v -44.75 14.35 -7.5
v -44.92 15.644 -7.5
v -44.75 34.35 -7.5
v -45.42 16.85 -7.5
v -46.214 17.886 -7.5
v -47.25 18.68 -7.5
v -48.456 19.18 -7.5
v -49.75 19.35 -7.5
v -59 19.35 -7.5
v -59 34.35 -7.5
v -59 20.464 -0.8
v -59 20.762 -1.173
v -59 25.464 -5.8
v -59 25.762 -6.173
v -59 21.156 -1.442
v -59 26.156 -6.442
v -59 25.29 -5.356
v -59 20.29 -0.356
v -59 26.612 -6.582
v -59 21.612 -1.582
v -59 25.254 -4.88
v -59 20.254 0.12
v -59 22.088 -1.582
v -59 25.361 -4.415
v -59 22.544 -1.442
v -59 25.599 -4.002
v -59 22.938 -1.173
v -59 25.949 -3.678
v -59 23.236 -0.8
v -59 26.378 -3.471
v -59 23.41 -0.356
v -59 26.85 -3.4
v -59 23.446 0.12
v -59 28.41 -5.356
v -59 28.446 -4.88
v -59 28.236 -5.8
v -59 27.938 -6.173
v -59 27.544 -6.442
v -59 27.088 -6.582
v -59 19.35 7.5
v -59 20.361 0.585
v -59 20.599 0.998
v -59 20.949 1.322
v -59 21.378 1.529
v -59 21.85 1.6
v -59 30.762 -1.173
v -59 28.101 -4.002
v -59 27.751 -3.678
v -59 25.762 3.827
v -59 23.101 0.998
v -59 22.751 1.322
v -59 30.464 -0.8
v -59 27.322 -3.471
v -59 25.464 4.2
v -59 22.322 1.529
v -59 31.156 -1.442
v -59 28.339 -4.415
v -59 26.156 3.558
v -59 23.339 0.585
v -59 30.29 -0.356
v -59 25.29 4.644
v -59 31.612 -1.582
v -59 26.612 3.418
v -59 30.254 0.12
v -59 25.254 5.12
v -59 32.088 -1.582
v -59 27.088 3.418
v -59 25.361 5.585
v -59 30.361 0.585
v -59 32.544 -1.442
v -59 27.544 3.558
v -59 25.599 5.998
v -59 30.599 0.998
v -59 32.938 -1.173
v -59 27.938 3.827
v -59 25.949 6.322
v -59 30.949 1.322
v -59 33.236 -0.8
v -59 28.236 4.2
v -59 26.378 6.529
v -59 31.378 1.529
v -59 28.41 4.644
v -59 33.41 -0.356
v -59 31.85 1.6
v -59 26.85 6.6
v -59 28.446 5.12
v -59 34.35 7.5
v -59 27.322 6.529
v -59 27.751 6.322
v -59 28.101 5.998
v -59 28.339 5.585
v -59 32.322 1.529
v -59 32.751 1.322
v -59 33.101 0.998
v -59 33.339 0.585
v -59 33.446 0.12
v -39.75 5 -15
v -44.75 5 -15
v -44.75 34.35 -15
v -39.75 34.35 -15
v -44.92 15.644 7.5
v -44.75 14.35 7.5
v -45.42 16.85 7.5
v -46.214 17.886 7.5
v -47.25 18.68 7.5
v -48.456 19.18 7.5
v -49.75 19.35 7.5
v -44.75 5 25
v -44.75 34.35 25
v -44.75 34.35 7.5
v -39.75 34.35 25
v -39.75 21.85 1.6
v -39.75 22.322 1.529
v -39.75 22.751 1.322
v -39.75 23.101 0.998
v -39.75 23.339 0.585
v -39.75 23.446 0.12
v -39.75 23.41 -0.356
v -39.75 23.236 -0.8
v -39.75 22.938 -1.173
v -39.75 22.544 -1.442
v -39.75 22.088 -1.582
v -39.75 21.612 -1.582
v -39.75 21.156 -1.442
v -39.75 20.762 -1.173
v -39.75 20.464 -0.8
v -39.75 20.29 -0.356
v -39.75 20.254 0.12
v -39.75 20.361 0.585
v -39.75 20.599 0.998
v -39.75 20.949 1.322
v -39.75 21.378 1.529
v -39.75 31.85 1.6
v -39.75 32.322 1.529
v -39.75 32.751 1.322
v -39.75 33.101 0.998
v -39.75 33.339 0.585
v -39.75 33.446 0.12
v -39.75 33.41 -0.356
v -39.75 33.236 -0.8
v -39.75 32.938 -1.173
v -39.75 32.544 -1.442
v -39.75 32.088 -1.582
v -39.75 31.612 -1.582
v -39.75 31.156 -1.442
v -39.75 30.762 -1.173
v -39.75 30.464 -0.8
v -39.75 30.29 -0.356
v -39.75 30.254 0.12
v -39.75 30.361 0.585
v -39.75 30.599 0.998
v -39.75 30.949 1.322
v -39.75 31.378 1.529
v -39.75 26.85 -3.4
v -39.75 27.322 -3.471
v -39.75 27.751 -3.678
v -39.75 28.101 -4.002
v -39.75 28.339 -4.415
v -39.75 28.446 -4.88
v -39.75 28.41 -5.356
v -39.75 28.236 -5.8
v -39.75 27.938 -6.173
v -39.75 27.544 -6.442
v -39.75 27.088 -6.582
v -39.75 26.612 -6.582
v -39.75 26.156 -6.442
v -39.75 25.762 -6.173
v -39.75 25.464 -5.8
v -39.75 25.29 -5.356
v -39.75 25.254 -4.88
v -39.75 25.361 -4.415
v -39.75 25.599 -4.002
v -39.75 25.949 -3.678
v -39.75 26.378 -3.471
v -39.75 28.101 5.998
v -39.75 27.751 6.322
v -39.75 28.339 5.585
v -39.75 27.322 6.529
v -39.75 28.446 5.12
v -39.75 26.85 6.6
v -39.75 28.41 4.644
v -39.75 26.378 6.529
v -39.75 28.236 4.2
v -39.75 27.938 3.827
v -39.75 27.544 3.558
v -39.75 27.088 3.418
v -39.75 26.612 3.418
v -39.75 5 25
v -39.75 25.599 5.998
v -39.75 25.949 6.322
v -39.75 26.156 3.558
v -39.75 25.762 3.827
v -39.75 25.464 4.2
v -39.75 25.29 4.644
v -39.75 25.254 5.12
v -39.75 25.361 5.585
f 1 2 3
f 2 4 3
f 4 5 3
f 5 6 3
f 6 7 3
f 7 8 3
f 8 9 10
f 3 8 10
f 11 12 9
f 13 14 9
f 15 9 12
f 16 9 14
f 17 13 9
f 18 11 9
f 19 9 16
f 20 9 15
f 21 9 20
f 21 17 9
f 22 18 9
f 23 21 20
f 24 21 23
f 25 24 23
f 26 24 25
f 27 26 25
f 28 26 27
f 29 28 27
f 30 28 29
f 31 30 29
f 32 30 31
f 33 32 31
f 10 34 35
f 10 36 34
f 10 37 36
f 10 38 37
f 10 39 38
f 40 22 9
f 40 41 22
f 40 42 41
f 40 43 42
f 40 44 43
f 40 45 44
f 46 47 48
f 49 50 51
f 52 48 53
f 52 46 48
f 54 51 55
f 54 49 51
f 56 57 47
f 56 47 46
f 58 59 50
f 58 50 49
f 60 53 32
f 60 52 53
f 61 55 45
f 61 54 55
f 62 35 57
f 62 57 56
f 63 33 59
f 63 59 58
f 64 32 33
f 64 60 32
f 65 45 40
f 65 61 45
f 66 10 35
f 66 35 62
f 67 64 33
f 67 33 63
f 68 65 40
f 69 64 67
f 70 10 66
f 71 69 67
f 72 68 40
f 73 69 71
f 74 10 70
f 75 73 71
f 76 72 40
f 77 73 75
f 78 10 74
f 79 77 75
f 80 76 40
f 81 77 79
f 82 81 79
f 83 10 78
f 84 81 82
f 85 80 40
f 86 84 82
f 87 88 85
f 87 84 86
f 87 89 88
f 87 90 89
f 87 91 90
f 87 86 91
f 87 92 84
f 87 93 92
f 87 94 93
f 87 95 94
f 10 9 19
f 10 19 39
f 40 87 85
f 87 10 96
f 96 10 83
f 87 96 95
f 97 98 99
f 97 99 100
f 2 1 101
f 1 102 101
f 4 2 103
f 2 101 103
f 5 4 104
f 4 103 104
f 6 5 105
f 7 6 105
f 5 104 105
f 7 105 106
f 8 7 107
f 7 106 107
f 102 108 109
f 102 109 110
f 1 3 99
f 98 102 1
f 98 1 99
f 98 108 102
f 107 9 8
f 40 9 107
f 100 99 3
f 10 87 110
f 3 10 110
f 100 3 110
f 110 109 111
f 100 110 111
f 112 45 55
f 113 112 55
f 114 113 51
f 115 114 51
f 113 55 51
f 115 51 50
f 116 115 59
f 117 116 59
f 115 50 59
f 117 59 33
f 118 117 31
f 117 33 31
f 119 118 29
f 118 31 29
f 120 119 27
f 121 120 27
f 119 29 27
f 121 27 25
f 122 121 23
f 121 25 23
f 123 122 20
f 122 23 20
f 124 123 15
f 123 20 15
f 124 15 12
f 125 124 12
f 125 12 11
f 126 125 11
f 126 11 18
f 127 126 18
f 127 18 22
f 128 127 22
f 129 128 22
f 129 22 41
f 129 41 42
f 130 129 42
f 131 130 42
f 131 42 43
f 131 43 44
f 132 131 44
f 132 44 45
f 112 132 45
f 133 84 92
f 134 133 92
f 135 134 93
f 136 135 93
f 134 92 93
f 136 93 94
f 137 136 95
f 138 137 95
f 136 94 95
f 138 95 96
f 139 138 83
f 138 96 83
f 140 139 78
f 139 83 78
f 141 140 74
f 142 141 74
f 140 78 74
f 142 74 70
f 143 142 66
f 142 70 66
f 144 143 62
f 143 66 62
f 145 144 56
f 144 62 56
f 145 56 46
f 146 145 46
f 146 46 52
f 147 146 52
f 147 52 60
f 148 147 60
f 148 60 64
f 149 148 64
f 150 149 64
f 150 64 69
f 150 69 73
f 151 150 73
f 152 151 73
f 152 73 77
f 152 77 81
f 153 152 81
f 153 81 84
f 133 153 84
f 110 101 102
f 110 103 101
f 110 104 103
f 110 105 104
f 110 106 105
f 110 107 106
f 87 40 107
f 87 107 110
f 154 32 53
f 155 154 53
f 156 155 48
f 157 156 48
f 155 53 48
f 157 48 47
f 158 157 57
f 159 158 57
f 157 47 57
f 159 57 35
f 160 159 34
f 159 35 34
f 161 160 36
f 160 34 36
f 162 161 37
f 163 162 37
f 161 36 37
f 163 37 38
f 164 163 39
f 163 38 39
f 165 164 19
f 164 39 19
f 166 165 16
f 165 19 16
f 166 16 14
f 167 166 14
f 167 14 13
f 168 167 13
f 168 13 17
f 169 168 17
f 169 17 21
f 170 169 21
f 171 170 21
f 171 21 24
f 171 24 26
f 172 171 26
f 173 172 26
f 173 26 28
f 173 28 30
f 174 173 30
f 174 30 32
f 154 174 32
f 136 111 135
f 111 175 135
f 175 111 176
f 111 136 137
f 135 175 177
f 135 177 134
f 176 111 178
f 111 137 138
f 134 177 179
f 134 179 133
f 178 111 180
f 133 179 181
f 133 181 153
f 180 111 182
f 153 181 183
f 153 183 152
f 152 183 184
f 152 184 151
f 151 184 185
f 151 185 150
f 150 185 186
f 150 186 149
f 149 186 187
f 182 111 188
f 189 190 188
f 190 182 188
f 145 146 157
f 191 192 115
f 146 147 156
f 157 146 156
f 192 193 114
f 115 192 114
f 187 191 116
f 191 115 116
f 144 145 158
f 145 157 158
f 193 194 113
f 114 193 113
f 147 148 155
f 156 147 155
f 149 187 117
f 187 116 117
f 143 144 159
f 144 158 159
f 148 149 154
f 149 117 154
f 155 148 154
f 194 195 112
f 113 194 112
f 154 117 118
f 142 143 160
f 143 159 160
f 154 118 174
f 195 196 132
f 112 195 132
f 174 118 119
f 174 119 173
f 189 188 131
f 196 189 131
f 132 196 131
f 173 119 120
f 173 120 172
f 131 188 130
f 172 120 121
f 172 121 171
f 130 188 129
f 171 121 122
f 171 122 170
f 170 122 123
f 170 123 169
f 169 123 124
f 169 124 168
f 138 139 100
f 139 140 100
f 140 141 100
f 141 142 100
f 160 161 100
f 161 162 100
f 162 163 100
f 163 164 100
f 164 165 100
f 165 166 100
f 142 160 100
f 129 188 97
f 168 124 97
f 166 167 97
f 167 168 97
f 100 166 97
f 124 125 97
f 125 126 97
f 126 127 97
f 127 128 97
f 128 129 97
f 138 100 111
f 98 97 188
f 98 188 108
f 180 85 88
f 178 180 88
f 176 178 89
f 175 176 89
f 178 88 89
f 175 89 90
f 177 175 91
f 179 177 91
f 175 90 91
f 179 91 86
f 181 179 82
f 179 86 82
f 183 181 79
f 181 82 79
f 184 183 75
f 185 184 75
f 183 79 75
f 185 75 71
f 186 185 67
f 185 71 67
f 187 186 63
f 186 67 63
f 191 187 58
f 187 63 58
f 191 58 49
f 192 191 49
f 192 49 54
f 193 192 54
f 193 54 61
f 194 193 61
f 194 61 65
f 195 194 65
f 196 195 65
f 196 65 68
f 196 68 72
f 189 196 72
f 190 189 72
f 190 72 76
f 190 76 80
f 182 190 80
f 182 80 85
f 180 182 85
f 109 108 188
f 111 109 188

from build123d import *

# Parameters (mm, degrees)
BOSS_EXTRUDE1_DEPTH     = 5
CUT_EXTRUDE1_DEPTH      = 114.468057179
CUT_EXTRUDE1_DEPTH_BACK = 114.468057179
SKETCH3_R               = 1.6
SKETCH4_R               = 2.55
CUT_EXTRUDE2_DEPTH      = 10
SKETCH5_R               = 1.55
CUT_EXTRUDE3_DEPTH      = 114.468057179
SKETCH6_R               = 1.55
CUT_EXTRUDE4_DEPTH      = 114.468057179
SKETCH7_W               = 23
SKETCH7_H               = 110
BOSS_EXTRUDE2_DEPTH     = 5
SKETCH9_W               = 5
SKETCH9_H               = 40
BOSS_EXTRUDE4_DEPTH     = 33
SKETCH11_W              = 12
SKETCH11_H              = 12
CUT_EXTRUDE5_DEPTH      = 50
SKETCH12_R              = 1.6
CUT_EXTRUDE6_DEPTH      = 50
BOSS_EXTRUDE5_START     = 14.25
SKETCH13_W              = 15
SKETCH13_H              = 15
SKETCH13_R              = 1.6
BOSS_EXTRUDE5_DEPTH     = 14.25
SKETCH15_W              = 89.5
SKETCH15_H              = 3.65
CUT_EXTRUDE9_DEPTH      = 153.144667997
SKETCH18_W              = 13
SKETCH18_H              = 110
CUT_EXTRUDE10_DEPTH     = 134.005347637
FILLET5_R               = 5
SKETCH19_R              = 1.55
CUT_EXTRUDE11_DEPTH     = 5
CUT_EXTRUDE12_DEPTH     = 189.758900452


with BuildPart() as part:
    # Sketch1 → Boss-Extrude1 (new body)
    with BuildSketch(Plane(origin=(0, 0, 0), x_dir=(1, 0, 0), z_dir=(0, 1, 0))):
        Polygon((75, 85), (-75, 85), (-75, -25), (-45, -45), (-45, -80), (45, -80), (45, -45), (75, -25), align=None)
        Polygon((-18.5, -10), (-18.5, 10), (-7.5, 10), (-7.5, 50), (7.5, 50), (7.5, 10), (18.5, 10), (18.5, -10), align=None, mode=Mode.SUBTRACT)
    extrude(amount=BOSS_EXTRUDE1_DEPTH)

    # Sketch3 → Cut-Extrude1 (cut, two sides: drawn at the far end of the back side and taken through both)
    with BuildSketch(Plane(origin=(0, 5, 0), x_dir=(1, 0, 0), z_dir=(0, 1, 0)).offset(-CUT_EXTRUDE1_DEPTH_BACK)):
        with Locations((-35, 20)):
            Circle(SKETCH3_R)
        with Locations((-35, -20)):
            Circle(SKETCH3_R)
        with Locations((35, -20)):
            Circle(SKETCH3_R)
        with Locations((35, 20)):
            Circle(SKETCH3_R)
    extrude(amount=CUT_EXTRUDE1_DEPTH + CUT_EXTRUDE1_DEPTH_BACK, mode=Mode.SUBTRACT)

    # Sketch4 → Cut-Extrude2 (cut)
    with BuildSketch(Plane(origin=(0, 5, 0), x_dir=(1, 0, 0), z_dir=(0, 1, 0))):
        with Locations((-65, 66)):
            Circle(SKETCH4_R)
        with Locations((-65, -4)):
            Circle(SKETCH4_R)
        with Locations((65, 66)):
            Circle(SKETCH4_R)
        with Locations((65, -4)):
            Circle(SKETCH4_R)
    extrude(amount=-CUT_EXTRUDE2_DEPTH, mode=Mode.SUBTRACT)

    # Sketch5 → Cut-Extrude3 (cut, through all)
    with BuildSketch(Plane(origin=(0, 5, 0), x_dir=(1, 0, 0), z_dir=(0, 1, 0))):
        with Locations((-39, -75)):
            Circle(SKETCH5_R)
        with Locations((39, -75)):
            Circle(SKETCH5_R)
        with Locations((-39, -50)):
            Circle(SKETCH5_R)
        with Locations((39, -50)):
            Circle(SKETCH5_R)
    extrude(amount=-CUT_EXTRUDE3_DEPTH, mode=Mode.SUBTRACT)

    # Sketch6 → Cut-Extrude4 (cut, through all)
    with BuildSketch(Plane(origin=(0, 5, 0), x_dir=(1, 0, 0), z_dir=(0, 1, 0))):
        with Locations((62.5, 80)):
            Circle(SKETCH6_R)
        with Locations((-62.5, 80)):
            Circle(SKETCH6_R)
    extrude(amount=-CUT_EXTRUDE4_DEPTH, mode=Mode.SUBTRACT)

    # Sketch7 → Boss-Extrude2 (add)
    with BuildSketch(Plane(origin=(0, 5, 0), x_dir=(1, 0, 0), z_dir=(0, 1, 0))):
        with Locations((-86.5, 30)):
            Rectangle(SKETCH7_W, SKETCH7_H)
        with Locations((86.5, 30)):
            Rectangle(SKETCH7_W, SKETCH7_H)
    extrude(amount=-BOSS_EXTRUDE2_DEPTH)

    # Sketch9 → Boss-Extrude4 (add)
    with BuildSketch(Plane(origin=(0, 5, 0), x_dir=(1, 0, 0), z_dir=(0, 1, 0))):
        with Locations((-42.25, -5)):
            Rectangle(SKETCH9_W, SKETCH9_H)
        with Locations((42.25, -5)):
            Rectangle(SKETCH9_W, SKETCH9_H)
    extrude(amount=BOSS_EXTRUDE4_DEPTH)

    # Sketch11 → Cut-Extrude5 (cut)
    with BuildSketch(Plane(origin=(0, 5, 0), x_dir=(1, 0, 0), z_dir=(0, 1, 0))):
        with Locations((-67, 18.305755671)):
            Rectangle(SKETCH11_W, SKETCH11_H)
        with Locations((67, 18.305755671)):
            Rectangle(SKETCH11_W, SKETCH11_H)
    extrude(amount=-CUT_EXTRUDE5_DEPTH, mode=Mode.SUBTRACT)

    # Sketch12 → Cut-Extrude6 (cut)
    with BuildSketch(Plane.ZY.offset(44.75)):
        with Locations((0, 31.85)):
            Circle(SKETCH12_R)
        with Locations((5, 26.85)):
            Circle(SKETCH12_R)
        with Locations((0, 21.85)):
            Circle(SKETCH12_R)
        with Locations((-5, 26.85)):
            Circle(SKETCH12_R)
    cut_extrude6 = extrude(amount=-CUT_EXTRUDE6_DEPTH, mode=Mode.SUBTRACT)

    # Sketch13 → Boss-Extrude5 (add)
    with BuildSketch(Plane.ZY.offset(44.75).offset(BOSS_EXTRUDE5_START)):
        with Locations((0, 26.85)):
            Rectangle(SKETCH13_W, SKETCH13_H)
        with Locations((0, 31.85)):
            Circle(SKETCH13_R, mode=Mode.SUBTRACT)
        with Locations((5, 26.85)):
            Circle(SKETCH13_R, mode=Mode.SUBTRACT)
        with Locations((-5, 26.85)):
            Circle(SKETCH13_R, mode=Mode.SUBTRACT)
        with Locations((0, 21.85)):
            Circle(SKETCH13_R, mode=Mode.SUBTRACT)
    boss_extrude5 = extrude(amount=-BOSS_EXTRUDE5_DEPTH)

    # Mirror2: Cut-Extrude6 across plane
    add(cut_extrude6.mirror(Plane.ZY), mode=Mode.SUBTRACT)

    # Mirror3: Boss-Extrude5 across plane
    add(boss_extrude5.mirror(Plane.ZY))

    # Sketch15 → Cut-Extrude9 (cut, through all)
    with BuildSketch(Plane.XY.offset(25)):
        with Locations((0, 36.175)):
            Rectangle(SKETCH15_W, SKETCH15_H)
    extrude(amount=-CUT_EXTRUDE9_DEPTH, mode=Mode.SUBTRACT)

    # Sketch18 → Cut-Extrude10 (cut, through all)
    with BuildSketch(Plane(origin=(0, 5, 0), x_dir=(1, 0, 0), z_dir=(0, 1, 0))):
        with Locations((-91.5, 30)):
            Rectangle(SKETCH18_W, SKETCH18_H)
        with Locations((91.5, 30)):
            Rectangle(SKETCH18_W, SKETCH18_H)
    extrude(amount=-CUT_EXTRUDE10_DEPTH, mode=Mode.SUBTRACT)

    # Fillet5
    fillet5_edges = [part.edges().sort_by_distance(p)[0] for p in [
        (44.75, 19.35, 0),
        (-44.75, 19.35, 0),
    ]]
    fillet(fillet5_edges, radius=FILLET5_R)

    # Sketch19 → Cut-Extrude11 (cut)
    with BuildSketch(Plane(origin=(0, 5, 0), x_dir=(1, 0, 0), z_dir=(0, 1, 0))):
        with Locations((55, 34.5)):
            Circle(SKETCH19_R)
        with Locations((25, 34.5)):
            Circle(SKETCH19_R)
        with Locations((25, 44.5)):
            Circle(SKETCH19_R)
        with Locations((55, 44.5)):
            Circle(SKETCH19_R)
    cut_extrude11 = extrude(amount=-CUT_EXTRUDE11_DEPTH, mode=Mode.SUBTRACT)

    # Mirror4: Cut-Extrude11 across plane
    add(cut_extrude11.mirror(Plane.ZY), mode=Mode.SUBTRACT)

    # Sketch21 → Cut-Extrude12 (cut, through all)
    with BuildSketch(Plane.XY.offset(80)):
        Polygon((-85, 5), (-85, 0), (85, 0), (85, 5), (59, 5), (59, 34.35), (39.75, 34.35), (39.75, 5), align=None)
    extrude(amount=-CUT_EXTRUDE12_DEPTH, mode=Mode.SUBTRACT)


solid = part.part
